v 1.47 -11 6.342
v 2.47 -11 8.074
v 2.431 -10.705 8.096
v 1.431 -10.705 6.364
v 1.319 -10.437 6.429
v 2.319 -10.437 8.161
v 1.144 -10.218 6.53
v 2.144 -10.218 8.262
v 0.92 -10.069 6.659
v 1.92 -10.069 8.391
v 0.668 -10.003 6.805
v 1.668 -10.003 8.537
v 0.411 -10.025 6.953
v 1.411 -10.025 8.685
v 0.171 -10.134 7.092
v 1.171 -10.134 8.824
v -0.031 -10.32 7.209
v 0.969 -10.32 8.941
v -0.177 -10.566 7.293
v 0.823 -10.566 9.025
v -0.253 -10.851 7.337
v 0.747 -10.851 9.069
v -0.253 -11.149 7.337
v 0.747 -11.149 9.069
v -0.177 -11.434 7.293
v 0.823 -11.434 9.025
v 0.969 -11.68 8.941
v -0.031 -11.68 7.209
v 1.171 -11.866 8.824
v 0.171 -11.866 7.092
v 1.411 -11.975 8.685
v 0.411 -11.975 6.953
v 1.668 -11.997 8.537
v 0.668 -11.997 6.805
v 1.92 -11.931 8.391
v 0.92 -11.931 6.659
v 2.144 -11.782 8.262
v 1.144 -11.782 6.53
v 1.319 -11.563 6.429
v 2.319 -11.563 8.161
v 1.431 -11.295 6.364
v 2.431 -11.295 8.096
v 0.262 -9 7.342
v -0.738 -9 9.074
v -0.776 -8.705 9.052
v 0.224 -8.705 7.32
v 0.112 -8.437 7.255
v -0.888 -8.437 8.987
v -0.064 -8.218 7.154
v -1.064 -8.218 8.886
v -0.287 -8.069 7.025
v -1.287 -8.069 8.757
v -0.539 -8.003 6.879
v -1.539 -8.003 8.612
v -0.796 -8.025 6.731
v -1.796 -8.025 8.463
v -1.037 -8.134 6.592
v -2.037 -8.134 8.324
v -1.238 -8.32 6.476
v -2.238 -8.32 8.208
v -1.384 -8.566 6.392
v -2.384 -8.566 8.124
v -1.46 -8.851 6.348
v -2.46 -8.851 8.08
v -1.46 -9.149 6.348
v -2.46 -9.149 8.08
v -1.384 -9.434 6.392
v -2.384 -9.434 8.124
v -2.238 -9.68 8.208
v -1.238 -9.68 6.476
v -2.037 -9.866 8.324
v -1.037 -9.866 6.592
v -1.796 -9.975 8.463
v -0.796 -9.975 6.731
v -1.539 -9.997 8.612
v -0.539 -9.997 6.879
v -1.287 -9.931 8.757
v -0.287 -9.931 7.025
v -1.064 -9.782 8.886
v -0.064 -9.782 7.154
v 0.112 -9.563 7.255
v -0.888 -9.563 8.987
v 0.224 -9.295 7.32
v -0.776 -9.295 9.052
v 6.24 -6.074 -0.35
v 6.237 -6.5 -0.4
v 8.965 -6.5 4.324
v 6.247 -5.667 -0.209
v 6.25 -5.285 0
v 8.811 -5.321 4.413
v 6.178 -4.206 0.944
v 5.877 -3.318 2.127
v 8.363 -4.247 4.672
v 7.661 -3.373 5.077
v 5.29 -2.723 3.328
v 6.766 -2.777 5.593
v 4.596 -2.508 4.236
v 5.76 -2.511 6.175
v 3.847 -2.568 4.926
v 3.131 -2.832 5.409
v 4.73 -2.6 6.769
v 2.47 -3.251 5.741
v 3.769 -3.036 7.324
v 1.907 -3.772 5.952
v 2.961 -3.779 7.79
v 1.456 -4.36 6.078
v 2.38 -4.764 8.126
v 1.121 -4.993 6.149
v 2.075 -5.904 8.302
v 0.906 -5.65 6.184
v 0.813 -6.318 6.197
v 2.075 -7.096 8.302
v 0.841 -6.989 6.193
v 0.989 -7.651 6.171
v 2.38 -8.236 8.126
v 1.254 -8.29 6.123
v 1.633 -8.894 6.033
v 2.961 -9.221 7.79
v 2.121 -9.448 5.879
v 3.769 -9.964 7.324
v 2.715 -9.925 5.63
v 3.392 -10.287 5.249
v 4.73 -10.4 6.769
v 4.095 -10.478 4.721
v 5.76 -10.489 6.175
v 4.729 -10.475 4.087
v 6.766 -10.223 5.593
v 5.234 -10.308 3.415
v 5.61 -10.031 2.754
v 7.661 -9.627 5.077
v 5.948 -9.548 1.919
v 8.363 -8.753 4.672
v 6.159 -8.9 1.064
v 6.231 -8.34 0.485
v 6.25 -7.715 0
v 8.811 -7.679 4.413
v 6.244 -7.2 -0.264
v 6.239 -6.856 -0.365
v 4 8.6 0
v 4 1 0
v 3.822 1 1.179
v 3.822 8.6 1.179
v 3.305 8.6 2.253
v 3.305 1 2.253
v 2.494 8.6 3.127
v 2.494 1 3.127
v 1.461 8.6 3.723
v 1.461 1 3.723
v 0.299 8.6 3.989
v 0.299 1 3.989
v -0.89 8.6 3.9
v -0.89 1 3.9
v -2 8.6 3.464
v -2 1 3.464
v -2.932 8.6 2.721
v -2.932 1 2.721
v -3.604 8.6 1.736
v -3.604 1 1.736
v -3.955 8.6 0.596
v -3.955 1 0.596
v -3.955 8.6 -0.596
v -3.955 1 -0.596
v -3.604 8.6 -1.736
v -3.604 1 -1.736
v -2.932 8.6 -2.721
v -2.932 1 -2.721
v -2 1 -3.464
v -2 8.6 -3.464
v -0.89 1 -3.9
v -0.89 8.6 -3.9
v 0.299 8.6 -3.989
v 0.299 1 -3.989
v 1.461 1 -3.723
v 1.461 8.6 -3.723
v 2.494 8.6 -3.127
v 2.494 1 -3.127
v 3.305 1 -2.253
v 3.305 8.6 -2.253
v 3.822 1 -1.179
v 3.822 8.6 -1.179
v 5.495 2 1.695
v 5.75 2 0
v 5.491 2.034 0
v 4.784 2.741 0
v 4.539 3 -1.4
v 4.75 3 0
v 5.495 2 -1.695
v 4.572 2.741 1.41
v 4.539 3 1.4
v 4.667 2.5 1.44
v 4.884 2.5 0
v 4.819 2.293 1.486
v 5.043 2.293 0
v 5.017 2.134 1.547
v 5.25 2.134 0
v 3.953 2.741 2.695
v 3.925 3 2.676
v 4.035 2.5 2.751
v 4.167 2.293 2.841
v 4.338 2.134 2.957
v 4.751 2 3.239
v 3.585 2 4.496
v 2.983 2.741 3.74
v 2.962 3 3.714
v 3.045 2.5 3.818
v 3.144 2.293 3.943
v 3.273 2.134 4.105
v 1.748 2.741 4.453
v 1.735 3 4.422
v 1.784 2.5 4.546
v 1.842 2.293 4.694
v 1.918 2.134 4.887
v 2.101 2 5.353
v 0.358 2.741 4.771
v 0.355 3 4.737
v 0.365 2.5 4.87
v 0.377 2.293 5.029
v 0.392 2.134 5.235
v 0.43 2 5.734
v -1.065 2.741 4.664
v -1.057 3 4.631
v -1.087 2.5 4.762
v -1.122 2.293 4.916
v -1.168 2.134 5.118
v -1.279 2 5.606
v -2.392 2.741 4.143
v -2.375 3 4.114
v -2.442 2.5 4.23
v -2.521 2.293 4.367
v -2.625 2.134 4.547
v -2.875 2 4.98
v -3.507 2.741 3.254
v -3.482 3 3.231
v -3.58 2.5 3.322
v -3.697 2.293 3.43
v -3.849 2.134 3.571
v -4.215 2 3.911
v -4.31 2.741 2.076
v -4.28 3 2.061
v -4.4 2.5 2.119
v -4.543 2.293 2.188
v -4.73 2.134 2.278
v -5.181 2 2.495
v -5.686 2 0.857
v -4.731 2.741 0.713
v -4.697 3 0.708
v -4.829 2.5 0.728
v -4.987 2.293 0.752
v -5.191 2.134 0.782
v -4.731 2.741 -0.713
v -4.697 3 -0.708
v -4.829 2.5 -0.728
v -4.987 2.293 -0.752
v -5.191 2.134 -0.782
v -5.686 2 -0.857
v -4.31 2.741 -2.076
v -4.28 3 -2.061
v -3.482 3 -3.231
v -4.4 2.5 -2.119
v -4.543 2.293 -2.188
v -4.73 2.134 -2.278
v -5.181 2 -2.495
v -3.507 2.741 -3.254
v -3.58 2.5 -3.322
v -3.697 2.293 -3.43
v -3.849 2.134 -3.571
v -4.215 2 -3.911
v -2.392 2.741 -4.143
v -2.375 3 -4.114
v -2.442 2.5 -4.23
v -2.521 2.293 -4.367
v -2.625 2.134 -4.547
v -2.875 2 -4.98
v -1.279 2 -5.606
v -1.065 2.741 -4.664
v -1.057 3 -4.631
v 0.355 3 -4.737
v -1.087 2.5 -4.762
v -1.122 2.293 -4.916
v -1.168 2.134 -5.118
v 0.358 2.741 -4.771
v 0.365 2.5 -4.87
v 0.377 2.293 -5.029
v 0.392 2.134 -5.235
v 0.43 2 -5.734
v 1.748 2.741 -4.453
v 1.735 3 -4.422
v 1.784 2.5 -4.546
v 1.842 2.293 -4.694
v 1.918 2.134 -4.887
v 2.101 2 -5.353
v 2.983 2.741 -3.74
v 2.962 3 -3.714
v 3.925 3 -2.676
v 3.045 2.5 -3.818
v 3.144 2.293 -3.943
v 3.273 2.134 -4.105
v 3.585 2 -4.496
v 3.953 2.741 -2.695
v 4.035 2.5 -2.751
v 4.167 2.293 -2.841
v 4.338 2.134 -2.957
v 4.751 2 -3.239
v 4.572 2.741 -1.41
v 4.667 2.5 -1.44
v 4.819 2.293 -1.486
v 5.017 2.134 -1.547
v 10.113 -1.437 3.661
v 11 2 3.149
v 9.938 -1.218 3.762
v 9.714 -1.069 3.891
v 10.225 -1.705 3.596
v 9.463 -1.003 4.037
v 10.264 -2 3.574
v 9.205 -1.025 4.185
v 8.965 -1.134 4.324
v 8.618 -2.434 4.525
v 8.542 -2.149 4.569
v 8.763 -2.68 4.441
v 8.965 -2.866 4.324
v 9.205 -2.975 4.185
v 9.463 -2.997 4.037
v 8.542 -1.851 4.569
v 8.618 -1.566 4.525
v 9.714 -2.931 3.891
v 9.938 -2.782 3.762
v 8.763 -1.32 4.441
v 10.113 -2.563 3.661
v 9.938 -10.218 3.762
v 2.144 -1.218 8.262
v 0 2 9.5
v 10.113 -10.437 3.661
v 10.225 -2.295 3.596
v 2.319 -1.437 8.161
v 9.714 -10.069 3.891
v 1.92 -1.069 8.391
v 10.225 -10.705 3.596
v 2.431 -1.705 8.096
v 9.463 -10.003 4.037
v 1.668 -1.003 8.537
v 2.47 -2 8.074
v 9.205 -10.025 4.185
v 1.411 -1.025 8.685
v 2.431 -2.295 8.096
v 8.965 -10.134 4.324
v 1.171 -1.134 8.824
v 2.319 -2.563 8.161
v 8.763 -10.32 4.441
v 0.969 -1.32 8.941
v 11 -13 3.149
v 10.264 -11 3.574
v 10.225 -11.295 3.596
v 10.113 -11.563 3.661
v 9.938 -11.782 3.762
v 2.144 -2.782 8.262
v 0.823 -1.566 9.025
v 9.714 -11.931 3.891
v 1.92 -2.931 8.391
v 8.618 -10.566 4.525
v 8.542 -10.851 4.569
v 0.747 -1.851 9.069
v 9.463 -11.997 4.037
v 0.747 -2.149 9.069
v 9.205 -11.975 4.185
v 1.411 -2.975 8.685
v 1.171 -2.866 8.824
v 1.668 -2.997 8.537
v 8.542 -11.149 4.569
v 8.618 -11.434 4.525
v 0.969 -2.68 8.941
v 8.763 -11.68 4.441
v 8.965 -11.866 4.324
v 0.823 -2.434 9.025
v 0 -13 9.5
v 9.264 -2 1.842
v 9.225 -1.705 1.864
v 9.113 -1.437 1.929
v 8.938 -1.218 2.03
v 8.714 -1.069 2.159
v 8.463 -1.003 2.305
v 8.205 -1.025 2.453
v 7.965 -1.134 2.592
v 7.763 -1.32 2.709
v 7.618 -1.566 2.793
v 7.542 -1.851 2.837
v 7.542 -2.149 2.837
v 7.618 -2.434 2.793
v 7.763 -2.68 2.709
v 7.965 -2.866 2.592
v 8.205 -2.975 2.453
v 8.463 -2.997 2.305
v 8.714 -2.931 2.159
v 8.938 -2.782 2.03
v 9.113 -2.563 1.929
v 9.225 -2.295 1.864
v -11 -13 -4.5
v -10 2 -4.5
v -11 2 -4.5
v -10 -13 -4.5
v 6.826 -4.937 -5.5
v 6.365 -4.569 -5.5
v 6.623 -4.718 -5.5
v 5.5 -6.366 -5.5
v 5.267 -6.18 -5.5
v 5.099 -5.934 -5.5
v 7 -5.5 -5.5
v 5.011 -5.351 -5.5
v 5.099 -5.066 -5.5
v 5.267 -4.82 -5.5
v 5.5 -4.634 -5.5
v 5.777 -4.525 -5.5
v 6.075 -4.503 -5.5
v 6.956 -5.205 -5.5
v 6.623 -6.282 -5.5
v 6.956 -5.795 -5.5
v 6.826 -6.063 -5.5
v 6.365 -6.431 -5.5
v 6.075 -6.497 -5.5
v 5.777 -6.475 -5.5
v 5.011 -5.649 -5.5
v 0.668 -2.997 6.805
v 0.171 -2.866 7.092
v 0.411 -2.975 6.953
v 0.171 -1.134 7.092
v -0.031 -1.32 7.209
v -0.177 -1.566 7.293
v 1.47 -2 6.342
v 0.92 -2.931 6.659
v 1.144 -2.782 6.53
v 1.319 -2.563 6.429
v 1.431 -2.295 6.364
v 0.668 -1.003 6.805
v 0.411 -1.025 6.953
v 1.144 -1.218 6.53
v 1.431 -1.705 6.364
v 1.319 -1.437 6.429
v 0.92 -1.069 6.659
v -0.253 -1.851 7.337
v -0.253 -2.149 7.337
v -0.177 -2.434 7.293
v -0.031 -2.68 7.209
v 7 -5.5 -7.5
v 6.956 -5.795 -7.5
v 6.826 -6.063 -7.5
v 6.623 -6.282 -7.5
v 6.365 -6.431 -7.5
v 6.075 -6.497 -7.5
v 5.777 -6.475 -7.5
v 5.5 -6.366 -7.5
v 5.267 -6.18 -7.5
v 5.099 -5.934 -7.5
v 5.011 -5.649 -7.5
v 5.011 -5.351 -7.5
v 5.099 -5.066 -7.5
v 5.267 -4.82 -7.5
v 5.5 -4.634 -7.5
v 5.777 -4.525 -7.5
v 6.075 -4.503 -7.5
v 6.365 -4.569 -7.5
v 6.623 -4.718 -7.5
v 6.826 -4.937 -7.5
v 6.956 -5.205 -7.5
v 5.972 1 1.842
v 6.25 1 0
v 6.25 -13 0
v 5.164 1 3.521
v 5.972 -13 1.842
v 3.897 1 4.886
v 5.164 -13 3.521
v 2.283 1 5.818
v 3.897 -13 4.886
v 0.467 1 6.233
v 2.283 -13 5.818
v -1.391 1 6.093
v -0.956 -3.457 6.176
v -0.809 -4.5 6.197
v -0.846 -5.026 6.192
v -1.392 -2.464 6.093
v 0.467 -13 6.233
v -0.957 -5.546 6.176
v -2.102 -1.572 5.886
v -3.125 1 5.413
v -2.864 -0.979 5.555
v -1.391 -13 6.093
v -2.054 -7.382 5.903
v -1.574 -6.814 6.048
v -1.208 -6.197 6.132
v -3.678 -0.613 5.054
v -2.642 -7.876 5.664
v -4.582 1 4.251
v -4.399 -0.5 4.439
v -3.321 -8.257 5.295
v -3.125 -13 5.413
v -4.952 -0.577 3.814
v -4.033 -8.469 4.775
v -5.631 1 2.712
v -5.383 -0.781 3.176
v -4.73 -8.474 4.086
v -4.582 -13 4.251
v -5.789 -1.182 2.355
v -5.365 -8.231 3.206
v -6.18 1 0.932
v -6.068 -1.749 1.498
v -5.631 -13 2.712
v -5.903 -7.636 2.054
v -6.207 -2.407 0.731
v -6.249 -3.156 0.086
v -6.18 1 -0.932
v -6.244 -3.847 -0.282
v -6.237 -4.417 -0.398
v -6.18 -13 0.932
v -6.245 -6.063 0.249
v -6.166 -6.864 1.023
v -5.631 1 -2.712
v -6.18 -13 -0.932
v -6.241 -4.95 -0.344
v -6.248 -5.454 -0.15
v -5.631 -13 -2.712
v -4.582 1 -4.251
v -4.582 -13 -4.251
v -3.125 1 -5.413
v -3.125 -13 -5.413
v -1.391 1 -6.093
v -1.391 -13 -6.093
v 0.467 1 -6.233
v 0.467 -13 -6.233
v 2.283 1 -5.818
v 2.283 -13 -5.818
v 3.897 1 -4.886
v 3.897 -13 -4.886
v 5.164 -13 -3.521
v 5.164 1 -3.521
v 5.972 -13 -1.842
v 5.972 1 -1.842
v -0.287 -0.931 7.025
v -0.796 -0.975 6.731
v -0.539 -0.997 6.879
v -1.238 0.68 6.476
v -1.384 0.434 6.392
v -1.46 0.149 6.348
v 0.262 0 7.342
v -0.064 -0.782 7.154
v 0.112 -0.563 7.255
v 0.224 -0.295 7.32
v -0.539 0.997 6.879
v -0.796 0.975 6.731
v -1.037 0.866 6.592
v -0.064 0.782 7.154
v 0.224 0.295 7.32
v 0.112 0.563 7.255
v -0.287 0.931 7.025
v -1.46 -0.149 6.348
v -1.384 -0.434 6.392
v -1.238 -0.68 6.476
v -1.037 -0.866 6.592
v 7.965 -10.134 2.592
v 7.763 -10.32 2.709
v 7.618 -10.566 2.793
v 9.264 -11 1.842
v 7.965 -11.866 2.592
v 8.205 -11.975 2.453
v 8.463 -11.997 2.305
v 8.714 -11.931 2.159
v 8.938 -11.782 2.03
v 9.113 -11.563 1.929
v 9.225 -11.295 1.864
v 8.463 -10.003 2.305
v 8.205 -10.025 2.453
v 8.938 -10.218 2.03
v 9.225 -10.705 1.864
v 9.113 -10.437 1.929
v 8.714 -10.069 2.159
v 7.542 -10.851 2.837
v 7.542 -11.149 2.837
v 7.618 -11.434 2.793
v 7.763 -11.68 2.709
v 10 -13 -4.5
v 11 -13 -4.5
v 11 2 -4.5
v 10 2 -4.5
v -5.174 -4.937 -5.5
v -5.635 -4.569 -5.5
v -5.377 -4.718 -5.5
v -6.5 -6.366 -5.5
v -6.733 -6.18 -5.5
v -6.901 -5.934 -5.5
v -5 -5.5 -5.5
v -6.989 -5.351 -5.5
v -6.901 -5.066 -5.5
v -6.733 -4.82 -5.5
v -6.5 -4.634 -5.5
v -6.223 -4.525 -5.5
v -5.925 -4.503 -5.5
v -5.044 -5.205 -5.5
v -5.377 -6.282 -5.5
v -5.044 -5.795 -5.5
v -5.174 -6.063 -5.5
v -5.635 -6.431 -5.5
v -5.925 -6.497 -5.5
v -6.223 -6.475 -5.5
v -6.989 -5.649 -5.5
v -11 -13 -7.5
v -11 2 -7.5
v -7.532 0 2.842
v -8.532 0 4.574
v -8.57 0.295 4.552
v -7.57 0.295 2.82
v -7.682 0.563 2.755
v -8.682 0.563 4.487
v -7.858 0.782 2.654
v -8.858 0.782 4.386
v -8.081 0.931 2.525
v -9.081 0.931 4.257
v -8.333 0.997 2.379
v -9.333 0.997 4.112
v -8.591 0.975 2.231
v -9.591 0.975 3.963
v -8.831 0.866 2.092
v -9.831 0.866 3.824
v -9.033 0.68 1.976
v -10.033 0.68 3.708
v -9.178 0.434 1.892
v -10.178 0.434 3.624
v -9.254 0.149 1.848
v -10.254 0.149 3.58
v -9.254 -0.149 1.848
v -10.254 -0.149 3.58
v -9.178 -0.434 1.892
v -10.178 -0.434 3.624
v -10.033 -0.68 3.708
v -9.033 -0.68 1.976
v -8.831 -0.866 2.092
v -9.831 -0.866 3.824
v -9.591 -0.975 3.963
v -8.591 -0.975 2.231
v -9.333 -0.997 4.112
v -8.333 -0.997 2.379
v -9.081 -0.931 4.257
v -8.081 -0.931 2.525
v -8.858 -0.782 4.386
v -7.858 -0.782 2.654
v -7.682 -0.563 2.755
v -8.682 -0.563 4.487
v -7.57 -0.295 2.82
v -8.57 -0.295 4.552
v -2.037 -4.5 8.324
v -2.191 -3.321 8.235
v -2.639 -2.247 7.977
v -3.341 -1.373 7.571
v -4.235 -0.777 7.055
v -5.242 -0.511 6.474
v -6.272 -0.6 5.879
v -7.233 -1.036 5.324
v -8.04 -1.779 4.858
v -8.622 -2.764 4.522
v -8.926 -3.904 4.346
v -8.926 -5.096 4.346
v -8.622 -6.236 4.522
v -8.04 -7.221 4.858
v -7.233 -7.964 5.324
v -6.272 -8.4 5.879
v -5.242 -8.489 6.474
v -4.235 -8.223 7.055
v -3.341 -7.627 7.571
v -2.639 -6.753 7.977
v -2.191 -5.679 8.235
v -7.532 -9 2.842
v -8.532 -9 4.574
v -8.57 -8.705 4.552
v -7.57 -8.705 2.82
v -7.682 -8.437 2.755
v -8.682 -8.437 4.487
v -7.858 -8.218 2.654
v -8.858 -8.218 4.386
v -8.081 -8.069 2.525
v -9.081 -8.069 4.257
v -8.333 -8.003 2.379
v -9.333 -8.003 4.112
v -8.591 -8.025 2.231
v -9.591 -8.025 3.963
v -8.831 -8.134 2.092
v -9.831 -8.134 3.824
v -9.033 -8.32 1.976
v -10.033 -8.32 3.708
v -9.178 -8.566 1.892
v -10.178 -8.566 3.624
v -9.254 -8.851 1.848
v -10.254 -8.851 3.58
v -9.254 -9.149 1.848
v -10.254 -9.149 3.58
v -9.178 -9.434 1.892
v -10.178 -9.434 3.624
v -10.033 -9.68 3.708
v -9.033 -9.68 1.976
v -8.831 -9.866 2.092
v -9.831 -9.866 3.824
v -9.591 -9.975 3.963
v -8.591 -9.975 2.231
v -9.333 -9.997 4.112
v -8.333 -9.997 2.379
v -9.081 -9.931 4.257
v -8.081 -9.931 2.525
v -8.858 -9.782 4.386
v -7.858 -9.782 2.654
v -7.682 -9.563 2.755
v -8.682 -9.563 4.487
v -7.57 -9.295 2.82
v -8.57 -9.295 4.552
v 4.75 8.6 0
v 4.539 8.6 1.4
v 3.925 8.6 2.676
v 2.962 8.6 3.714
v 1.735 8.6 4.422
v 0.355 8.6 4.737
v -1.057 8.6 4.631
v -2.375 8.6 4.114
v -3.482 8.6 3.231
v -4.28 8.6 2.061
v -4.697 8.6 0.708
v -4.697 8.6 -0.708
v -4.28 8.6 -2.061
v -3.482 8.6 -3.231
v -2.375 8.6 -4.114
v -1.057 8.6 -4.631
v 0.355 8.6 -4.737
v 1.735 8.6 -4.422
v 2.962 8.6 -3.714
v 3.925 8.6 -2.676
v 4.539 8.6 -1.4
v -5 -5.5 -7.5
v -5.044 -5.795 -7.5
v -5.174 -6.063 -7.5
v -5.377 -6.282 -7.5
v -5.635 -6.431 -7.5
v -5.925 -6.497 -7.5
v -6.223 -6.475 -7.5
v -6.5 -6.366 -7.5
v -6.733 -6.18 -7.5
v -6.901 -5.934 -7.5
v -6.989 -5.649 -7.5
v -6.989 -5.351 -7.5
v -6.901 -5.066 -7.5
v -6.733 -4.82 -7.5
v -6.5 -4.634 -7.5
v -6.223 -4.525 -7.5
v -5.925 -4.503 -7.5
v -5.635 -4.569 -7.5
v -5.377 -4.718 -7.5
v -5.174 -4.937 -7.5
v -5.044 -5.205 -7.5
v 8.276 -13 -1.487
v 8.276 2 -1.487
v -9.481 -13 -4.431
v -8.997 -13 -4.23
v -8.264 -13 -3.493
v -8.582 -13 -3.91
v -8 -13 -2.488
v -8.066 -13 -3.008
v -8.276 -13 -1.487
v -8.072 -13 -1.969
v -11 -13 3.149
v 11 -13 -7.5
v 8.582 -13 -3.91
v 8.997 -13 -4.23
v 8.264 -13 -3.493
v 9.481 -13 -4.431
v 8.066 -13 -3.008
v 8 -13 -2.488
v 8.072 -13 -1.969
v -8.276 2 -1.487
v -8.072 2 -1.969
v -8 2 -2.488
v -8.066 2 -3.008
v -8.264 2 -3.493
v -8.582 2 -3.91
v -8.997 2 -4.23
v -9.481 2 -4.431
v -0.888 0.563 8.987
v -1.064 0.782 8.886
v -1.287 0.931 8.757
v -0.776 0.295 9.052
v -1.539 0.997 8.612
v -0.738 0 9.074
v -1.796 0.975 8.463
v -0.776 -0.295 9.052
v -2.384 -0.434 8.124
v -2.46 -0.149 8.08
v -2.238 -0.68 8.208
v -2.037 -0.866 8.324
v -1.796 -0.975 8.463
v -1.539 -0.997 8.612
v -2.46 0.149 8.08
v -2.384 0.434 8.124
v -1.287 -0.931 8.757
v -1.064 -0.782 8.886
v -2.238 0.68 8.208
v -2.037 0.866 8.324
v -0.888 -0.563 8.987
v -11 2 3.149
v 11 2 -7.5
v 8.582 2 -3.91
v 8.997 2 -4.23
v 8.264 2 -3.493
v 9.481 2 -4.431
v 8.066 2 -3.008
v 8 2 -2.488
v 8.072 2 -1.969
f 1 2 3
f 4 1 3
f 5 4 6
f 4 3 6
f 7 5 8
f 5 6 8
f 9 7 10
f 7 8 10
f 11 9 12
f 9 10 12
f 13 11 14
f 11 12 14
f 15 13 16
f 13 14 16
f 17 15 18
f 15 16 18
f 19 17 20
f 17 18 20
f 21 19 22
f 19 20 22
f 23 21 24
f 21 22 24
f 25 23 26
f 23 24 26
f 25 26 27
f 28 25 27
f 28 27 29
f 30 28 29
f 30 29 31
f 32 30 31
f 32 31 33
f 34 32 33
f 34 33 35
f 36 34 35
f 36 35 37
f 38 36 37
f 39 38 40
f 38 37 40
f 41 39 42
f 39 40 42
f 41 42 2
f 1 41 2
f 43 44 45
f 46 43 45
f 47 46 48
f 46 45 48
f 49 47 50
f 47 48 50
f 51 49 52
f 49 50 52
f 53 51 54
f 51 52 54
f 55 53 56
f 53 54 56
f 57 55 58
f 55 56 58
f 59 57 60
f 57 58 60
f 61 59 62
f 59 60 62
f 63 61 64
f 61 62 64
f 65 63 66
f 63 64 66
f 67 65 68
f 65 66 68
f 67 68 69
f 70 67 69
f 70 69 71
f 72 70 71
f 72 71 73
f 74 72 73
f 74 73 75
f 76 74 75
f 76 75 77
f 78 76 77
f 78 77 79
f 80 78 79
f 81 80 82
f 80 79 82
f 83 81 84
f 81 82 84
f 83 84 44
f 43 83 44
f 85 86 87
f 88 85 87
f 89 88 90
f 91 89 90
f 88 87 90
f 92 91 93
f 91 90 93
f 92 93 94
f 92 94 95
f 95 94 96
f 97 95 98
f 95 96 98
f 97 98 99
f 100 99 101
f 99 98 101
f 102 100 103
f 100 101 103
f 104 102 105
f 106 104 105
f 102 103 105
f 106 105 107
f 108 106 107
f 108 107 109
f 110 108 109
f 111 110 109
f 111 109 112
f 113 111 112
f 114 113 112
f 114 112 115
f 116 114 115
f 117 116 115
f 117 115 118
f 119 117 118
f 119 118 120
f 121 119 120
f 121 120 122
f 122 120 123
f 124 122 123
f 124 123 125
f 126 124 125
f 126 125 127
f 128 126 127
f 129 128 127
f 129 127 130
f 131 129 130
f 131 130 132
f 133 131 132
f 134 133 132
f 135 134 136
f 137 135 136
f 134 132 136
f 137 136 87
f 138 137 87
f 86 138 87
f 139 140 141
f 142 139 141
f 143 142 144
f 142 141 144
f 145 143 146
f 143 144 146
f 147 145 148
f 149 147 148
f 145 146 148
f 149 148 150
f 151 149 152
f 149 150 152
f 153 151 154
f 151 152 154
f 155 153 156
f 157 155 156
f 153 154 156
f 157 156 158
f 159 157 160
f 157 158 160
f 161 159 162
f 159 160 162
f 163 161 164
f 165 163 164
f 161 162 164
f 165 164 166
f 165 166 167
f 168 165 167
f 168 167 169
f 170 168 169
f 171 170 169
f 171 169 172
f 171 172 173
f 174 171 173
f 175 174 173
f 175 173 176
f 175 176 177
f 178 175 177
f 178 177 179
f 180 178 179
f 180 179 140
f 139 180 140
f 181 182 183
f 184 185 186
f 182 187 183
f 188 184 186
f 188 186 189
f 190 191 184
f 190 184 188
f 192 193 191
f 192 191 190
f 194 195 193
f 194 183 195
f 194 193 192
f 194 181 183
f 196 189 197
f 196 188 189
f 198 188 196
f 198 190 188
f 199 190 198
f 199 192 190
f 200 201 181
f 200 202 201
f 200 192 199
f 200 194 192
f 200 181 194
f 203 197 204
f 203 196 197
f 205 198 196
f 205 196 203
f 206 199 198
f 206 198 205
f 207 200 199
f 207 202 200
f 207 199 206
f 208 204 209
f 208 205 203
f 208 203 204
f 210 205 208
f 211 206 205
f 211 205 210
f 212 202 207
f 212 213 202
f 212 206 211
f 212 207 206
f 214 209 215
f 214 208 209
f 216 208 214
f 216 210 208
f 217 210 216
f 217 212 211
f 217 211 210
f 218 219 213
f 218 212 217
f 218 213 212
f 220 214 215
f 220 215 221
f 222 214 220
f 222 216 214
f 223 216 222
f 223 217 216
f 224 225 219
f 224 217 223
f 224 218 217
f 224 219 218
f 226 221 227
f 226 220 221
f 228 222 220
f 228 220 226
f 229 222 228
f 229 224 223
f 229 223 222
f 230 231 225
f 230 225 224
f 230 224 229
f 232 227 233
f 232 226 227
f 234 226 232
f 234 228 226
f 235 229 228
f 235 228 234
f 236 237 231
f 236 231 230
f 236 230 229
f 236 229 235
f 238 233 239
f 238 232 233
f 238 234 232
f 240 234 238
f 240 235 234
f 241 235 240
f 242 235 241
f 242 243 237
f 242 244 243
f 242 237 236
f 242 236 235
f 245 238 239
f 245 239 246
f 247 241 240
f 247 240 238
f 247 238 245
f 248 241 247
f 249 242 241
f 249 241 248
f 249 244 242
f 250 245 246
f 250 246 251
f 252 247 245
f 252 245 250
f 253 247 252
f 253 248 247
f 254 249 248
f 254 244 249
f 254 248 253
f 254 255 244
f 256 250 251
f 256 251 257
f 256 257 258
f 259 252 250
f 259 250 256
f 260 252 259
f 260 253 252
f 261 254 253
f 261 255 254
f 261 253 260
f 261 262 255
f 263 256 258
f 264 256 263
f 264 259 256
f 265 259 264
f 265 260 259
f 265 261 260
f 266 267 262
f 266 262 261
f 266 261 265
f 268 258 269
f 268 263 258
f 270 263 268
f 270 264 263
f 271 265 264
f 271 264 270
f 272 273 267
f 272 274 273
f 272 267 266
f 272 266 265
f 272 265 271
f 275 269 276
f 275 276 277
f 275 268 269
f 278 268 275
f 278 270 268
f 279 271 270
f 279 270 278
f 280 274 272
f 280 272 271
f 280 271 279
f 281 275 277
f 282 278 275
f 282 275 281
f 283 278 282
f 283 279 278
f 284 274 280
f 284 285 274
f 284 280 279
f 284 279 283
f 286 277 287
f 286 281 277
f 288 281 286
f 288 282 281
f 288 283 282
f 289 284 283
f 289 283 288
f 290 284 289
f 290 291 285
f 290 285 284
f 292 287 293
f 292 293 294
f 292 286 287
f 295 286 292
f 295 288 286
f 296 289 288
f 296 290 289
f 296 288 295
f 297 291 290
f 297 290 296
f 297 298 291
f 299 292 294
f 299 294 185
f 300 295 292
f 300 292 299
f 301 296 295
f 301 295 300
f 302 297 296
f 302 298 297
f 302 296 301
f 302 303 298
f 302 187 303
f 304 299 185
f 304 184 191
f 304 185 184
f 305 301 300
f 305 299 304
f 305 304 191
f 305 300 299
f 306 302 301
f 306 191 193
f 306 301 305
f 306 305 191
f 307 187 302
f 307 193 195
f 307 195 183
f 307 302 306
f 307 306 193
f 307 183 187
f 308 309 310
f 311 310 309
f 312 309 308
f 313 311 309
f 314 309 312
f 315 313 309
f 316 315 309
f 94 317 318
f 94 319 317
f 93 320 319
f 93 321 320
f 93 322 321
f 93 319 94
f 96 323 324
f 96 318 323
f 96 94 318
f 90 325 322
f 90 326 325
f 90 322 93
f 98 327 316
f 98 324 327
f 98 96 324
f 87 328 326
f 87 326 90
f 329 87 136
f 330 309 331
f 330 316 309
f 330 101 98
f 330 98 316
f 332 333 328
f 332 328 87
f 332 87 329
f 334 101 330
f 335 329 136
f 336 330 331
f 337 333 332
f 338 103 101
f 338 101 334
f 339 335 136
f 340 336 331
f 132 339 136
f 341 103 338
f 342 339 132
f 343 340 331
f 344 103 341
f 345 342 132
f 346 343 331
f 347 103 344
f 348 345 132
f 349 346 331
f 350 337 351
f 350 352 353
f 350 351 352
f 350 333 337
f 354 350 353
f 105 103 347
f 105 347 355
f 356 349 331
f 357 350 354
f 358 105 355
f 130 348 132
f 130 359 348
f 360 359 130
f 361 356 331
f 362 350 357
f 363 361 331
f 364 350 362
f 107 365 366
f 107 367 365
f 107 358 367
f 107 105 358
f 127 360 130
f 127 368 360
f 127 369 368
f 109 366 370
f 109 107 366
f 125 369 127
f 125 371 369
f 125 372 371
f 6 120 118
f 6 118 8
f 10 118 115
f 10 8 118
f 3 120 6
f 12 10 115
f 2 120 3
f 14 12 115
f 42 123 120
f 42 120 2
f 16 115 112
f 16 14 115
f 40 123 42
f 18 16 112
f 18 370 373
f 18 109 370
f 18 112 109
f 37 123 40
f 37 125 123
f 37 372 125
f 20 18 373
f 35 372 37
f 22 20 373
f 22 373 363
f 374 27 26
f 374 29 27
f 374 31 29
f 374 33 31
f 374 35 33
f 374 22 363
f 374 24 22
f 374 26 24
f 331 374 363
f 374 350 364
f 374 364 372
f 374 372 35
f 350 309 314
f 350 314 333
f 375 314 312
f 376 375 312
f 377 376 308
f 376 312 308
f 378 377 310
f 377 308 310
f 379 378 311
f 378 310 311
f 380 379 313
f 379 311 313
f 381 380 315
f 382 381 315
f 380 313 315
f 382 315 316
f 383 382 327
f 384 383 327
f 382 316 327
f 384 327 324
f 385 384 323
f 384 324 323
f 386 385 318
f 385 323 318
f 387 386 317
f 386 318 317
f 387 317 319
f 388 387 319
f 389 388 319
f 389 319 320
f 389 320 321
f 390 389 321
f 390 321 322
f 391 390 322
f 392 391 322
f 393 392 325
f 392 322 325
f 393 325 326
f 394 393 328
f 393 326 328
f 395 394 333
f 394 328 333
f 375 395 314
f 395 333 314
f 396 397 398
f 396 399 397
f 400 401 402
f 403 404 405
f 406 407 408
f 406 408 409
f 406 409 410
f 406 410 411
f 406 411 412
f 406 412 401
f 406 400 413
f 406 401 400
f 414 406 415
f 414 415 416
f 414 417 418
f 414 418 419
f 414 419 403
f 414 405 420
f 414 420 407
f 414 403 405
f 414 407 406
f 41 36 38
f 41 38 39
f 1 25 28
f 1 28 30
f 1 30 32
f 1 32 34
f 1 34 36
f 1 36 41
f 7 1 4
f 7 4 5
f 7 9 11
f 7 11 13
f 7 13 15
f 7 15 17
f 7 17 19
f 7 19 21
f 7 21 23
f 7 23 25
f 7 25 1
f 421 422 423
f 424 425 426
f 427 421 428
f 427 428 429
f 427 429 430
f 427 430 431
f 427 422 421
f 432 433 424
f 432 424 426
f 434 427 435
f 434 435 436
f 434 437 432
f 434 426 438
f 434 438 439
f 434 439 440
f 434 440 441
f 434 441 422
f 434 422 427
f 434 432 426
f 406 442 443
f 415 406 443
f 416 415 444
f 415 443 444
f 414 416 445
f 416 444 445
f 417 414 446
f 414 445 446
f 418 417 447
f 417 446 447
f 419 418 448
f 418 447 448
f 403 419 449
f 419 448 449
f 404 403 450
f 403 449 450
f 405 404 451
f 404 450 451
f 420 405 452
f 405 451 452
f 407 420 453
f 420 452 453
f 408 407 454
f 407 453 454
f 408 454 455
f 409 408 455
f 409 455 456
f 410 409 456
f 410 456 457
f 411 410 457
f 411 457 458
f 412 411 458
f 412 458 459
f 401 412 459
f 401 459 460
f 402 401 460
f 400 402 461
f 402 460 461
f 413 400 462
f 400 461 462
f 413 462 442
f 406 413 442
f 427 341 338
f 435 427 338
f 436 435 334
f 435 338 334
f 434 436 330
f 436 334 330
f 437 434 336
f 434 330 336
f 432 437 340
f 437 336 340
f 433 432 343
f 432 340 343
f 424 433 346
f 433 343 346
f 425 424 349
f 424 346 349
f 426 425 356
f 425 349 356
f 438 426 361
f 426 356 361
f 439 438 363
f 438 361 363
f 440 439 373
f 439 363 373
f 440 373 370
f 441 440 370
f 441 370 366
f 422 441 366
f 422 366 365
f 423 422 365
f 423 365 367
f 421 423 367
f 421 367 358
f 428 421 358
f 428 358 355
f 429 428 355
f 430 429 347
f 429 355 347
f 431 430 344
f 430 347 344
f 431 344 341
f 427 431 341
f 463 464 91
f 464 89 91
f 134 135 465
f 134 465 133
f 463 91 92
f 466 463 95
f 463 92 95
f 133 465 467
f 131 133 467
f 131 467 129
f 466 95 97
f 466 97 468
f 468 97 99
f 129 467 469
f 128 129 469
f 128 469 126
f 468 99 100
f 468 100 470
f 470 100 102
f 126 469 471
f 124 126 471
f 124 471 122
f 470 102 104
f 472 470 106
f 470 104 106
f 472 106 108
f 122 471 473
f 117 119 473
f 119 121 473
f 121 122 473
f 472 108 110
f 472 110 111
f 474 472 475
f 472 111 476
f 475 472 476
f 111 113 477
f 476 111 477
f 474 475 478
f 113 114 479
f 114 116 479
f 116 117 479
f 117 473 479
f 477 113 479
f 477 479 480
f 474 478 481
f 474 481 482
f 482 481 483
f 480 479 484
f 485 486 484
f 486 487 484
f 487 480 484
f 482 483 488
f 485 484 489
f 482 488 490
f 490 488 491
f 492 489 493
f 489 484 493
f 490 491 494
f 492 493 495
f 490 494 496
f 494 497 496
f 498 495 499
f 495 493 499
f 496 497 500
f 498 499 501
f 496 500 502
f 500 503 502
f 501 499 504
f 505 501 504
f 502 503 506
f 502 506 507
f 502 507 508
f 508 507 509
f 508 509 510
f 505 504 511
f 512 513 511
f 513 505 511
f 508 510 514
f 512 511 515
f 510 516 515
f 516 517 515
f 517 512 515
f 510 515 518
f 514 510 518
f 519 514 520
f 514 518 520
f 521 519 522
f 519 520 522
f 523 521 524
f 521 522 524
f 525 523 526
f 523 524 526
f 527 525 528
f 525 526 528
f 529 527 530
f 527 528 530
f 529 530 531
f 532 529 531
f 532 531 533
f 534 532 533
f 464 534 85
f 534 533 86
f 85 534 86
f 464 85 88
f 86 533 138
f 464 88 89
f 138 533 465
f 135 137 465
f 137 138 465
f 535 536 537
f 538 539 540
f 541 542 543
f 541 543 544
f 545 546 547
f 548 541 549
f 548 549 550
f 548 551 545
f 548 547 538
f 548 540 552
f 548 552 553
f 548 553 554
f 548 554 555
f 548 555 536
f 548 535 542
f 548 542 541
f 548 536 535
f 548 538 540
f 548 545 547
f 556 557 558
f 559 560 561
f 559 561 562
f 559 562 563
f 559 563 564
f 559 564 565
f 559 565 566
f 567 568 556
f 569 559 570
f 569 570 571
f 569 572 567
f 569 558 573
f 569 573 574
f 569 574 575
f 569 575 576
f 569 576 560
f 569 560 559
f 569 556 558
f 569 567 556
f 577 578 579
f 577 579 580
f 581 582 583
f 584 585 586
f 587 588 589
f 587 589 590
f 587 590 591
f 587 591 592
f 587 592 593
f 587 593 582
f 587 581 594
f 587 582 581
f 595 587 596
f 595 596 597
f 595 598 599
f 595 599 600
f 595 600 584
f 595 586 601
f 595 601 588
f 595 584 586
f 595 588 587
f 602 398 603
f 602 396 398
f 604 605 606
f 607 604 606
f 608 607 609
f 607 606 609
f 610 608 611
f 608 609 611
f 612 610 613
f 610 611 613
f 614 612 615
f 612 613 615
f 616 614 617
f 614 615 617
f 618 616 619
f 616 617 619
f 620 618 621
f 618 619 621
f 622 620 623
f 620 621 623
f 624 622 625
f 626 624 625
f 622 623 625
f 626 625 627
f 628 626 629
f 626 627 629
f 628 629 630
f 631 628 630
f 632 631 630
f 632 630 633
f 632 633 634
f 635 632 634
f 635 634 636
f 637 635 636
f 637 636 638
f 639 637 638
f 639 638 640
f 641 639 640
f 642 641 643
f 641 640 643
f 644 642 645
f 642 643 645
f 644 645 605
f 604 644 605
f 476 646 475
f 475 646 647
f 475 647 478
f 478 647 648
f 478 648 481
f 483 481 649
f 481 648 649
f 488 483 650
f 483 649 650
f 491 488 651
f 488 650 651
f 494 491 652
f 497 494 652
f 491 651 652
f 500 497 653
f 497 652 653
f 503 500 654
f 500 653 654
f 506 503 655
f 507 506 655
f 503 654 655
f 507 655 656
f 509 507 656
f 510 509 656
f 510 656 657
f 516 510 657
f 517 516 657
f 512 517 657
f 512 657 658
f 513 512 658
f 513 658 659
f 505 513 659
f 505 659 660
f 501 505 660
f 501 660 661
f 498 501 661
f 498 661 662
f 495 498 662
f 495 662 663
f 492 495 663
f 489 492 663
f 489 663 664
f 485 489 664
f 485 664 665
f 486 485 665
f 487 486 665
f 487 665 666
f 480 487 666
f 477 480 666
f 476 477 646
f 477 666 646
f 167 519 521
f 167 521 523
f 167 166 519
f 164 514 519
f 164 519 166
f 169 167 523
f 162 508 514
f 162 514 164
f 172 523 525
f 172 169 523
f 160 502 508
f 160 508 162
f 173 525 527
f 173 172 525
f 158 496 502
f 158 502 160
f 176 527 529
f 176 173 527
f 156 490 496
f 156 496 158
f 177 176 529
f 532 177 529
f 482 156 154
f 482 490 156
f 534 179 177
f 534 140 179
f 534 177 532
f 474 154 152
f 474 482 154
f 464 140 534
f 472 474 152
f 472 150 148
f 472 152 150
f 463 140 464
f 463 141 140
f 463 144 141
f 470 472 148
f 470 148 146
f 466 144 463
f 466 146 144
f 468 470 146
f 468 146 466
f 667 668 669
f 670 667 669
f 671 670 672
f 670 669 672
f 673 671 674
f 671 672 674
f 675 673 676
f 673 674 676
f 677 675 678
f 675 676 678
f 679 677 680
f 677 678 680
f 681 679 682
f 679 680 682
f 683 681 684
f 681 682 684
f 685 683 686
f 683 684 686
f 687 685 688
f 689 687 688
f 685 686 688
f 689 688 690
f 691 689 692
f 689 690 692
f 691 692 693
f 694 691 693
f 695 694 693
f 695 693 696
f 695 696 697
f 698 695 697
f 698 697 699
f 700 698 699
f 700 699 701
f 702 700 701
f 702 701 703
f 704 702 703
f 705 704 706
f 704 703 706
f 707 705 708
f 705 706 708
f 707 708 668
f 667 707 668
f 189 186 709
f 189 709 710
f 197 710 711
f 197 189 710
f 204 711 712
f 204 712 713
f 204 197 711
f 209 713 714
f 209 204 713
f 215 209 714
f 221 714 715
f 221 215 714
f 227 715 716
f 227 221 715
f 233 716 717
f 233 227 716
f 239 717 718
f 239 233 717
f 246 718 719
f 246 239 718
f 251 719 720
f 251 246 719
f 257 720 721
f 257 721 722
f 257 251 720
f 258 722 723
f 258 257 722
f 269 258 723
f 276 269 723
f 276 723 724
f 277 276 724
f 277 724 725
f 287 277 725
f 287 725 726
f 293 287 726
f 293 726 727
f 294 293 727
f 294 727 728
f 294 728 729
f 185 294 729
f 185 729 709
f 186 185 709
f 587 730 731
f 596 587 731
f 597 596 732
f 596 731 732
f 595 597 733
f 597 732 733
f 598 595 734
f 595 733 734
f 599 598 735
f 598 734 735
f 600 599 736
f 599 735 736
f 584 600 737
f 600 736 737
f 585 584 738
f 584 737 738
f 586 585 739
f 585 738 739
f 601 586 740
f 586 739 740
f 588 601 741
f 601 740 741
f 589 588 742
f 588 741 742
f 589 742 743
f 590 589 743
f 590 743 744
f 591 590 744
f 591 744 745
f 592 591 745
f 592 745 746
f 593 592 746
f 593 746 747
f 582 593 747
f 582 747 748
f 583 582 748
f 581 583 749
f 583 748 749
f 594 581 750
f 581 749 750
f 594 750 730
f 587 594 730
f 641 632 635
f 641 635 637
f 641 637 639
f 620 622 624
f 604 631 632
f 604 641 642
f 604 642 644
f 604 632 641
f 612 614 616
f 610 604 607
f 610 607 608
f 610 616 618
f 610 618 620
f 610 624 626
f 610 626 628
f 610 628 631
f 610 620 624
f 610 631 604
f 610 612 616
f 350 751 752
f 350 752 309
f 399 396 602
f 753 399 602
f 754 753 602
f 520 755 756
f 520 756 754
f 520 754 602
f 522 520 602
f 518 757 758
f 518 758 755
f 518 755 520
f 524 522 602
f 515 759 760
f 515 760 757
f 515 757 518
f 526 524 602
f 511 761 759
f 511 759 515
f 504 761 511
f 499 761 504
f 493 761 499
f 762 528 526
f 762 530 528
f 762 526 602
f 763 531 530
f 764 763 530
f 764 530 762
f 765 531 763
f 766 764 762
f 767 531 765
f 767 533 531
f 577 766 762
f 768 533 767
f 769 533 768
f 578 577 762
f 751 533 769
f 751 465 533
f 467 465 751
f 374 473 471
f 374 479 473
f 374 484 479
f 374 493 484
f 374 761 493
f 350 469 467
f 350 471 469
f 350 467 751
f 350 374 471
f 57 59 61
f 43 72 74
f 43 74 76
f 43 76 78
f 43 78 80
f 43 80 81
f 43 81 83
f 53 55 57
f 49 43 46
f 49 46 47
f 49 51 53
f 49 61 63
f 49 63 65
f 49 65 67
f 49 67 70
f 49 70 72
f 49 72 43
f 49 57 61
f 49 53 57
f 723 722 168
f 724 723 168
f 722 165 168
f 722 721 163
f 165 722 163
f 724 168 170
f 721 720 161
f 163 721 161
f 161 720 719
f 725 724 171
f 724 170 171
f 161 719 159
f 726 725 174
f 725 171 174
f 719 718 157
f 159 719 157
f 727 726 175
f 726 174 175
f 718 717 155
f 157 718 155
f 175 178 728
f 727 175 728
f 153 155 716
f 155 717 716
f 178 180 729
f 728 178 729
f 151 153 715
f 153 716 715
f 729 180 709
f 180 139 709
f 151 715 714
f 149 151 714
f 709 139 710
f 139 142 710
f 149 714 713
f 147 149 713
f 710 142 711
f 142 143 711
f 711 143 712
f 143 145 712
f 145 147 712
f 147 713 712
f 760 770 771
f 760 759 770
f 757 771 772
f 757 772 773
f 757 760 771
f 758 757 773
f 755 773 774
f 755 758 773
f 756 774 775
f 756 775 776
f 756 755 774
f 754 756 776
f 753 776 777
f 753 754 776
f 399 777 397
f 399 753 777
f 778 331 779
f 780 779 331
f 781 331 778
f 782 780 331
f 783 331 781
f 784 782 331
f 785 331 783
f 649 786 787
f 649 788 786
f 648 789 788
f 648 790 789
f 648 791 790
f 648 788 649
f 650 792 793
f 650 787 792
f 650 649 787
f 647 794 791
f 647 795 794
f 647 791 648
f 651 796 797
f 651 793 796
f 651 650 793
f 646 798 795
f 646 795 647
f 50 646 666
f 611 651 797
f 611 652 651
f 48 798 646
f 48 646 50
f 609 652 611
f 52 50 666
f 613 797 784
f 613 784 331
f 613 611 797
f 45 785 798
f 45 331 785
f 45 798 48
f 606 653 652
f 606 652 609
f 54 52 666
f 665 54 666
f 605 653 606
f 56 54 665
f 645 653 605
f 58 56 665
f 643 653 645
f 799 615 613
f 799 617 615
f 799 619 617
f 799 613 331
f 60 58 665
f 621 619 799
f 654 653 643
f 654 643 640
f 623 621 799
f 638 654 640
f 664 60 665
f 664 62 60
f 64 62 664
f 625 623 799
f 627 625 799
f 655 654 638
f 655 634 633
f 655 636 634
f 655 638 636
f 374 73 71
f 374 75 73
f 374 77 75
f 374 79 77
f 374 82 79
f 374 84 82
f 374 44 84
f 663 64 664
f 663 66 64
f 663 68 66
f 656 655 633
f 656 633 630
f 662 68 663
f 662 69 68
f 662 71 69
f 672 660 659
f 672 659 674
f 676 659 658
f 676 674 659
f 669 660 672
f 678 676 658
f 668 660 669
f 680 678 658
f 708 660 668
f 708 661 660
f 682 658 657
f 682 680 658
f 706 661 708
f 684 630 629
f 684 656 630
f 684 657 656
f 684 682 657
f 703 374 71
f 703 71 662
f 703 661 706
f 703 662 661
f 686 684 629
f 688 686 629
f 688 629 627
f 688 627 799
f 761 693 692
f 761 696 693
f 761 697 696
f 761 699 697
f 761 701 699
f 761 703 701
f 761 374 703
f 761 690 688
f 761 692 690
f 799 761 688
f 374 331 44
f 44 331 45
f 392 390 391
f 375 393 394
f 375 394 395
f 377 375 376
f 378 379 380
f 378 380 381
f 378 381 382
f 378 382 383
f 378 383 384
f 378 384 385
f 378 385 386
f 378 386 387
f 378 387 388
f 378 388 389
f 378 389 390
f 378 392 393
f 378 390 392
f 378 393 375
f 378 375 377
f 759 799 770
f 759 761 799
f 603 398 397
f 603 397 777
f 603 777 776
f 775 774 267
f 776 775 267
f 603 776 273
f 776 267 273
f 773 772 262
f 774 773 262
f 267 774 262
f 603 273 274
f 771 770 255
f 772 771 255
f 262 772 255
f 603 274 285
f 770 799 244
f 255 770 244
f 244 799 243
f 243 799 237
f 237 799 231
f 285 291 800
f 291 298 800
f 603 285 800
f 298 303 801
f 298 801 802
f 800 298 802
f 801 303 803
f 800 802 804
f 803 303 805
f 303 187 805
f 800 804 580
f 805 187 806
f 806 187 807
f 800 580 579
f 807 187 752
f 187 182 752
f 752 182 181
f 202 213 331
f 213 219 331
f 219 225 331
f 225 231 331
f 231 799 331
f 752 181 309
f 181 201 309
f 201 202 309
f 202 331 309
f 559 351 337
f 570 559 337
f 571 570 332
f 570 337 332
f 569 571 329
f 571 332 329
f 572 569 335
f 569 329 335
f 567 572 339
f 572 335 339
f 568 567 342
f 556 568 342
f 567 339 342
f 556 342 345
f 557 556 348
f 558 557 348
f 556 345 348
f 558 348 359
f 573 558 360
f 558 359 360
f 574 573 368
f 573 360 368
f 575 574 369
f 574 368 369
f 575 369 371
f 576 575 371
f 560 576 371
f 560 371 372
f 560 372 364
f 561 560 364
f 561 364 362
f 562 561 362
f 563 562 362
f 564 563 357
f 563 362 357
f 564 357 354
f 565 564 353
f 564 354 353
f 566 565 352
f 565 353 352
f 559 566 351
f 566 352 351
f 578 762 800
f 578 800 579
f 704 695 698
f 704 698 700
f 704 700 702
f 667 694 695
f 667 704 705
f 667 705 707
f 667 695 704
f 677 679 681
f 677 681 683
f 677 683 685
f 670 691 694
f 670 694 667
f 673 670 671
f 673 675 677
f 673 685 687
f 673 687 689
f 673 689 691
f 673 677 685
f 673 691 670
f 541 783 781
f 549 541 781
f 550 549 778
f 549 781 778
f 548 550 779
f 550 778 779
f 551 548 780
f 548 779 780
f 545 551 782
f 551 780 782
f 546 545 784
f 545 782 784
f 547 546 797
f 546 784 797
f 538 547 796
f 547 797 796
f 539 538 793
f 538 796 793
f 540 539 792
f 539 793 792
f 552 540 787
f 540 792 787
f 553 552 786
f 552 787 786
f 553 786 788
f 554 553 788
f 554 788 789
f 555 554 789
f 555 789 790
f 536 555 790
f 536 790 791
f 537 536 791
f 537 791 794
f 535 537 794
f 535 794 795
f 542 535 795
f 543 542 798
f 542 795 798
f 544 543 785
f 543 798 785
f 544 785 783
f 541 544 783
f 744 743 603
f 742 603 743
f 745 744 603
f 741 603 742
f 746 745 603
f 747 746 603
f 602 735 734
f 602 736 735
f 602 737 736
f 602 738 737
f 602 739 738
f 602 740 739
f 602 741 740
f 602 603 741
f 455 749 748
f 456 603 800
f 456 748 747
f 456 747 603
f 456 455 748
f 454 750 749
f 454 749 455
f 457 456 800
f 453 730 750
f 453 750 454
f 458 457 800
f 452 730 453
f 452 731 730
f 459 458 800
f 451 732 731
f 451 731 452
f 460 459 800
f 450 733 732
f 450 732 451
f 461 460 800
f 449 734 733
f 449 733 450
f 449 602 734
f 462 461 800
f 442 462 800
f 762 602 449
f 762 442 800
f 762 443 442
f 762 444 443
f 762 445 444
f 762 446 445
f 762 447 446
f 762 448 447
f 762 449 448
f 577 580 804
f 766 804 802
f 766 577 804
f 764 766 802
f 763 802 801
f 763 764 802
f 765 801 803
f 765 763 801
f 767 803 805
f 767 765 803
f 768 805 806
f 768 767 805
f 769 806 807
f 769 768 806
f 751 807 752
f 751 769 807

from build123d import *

# Parameters (mm, degrees)
F0_R      = 6.25
F1_DEPTH  = 13
F0_R_2    = 4.75
F0_R_3    = 4
F2_DEPTH  = 2
F3_DEPTH  = 8.6
F4_R      = 1
F5_R      = 4
F7_DEPTH  = 6.4553484435
F5_R_2    = 1
F8_DEPTH  = 2
F6_R      = 4
F9_DEPTH  = 6.4553484442
F6_R_2    = 1
F10_DEPTH = 2
F11_DEPTH = 1
F12_R     = 1
F13_DEPTH = 2


with BuildPart() as f1:
    # F0 (on Front) → F1 (new body)
    with BuildSketch(Plane.XZ):
        with BuildLine():
            Line((-11, -4.5), (-11, -7.5))
            Line((-11, -7.5), (11, -7.5))
            Line((11, -7.5), (11, -4.5))
            Line((11, -4.5), (10, -4.5))
            ThreePointArc((10, -4.5), (8.2641129984, -3.493325887), (8.2756985044, -1.4866963178))
            Line((8.2756985044, -1.4866963178), (11, 3.1491470389))
            Line((11, 3.1491470389), (0, 9.5))
            Line((0, 9.5), (-11, 3.1491470389))
            Line((-11, 3.1491470389), (-8.2756985044, -1.4866963178))
            ThreePointArc((-8.2756985044, -1.4866963178), (-8.2641129984, -3.493325887), (-10, -4.5))
            Line((-10, -4.5), (-11, -4.5))
        make_face()
        Circle(F0_R, mode=Mode.SUBTRACT)
    extrude(amount=F1_DEPTH)

    # F0 (on Front) → F2 (join)
    with BuildSketch(Plane.XZ):
        with BuildLine():
            Line((-11, -4.5), (-11, -7.5))
            Line((-11, -7.5), (11, -7.5))
            Line((11, -7.5), (11, -4.5))
            Line((11, -4.5), (10, -4.5))
            ThreePointArc((10, -4.5), (8.2641129984, -3.493325887), (8.2756985044, -1.4866963178))
            Line((8.2756985044, -1.4866963178), (11, 3.1491470389))
            Line((11, 3.1491470389), (0, 9.5))
            Line((0, 9.5), (-11, 3.1491470389))
            Line((-11, 3.1491470389), (-8.2756985044, -1.4866963178))
            ThreePointArc((-8.2756985044, -1.4866963178), (-8.2641129984, -3.493325887), (-10, -4.5))
            Line((-10, -4.5), (-11, -4.5))
        make_face()
        Circle(F0_R, mode=Mode.SUBTRACT)
        Circle(F0_R)
        Circle(F0_R_2, mode=Mode.SUBTRACT)
        Circle(F0_R_2)
        Circle(F0_R_3, mode=Mode.SUBTRACT)
    extrude(amount=-F2_DEPTH)

    # F0 (on Front) → F3 (join)
    with BuildSketch(Plane.XZ):
        Circle(F0_R_2)
        Circle(F0_R_3, mode=Mode.SUBTRACT)
    extrude(amount=-F3_DEPTH)

    # F4
    f4_edges = [f1.edges().sort_by_distance(p)[0] for p in [
        (-4.75, 2, 0),
    ]]
    fillet(f4_edges, radius=F4_R)

    # F5 (on face) → F7 (cut, up to face)
    with BuildSketch(Plane(origin=(4.113620668, 0, 7.125), x_dir=(0.8660254038, 0, -0.5), z_dir=(0.5, 0, 0.8660254038))):
        with Locations((1.6017059222, -6.5)):
            Circle(F5_R)
    extrude(amount=-F7_DEPTH, mode=Mode.SUBTRACT)

    # F5 (on face) → F8 (cut)
    with BuildSketch(Plane(origin=(4.113620668, 0, 7.125), x_dir=(0.8660254038, 0, -0.5), z_dir=(0.5, 0, 0.8660254038))):
        with Locations((-2.8982940778, -2)):
            Circle(F5_R_2)
        with Locations((6.1017059222, -2)):
            Circle(F5_R_2)
        with Locations((6.1017059222, -11)):
            Circle(F5_R_2)
        with Locations((-2.8982940778, -11)):
            Circle(F5_R_2)
    extrude(amount=-F8_DEPTH, mode=Mode.SUBTRACT)

    # F6 (on face) → F9 (cut, up to face)
    with BuildSketch(Plane(origin=(-4.113620668, 0, 7.125), x_dir=(0.8660254038, 0, 0.5), z_dir=(-0.5, 0, 0.8660254038))):
        with Locations((-1.6017059222, -4.5)):
            Circle(F6_R)
    extrude(amount=-F9_DEPTH, mode=Mode.SUBTRACT)

    # F6 (on face) → F10 (cut)
    with BuildSketch(Plane(origin=(-4.113620668, 0, 7.125), x_dir=(0.8660254038, 0, 0.5), z_dir=(-0.5, 0, 0.8660254038))):
        with Locations((-6.1017059222, -9)):
            Circle(F6_R_2)
        with Locations((-6.1017059222, 0)):
            Circle(F6_R_2)
        with Locations((2.8982940778, 0)):
            Circle(F6_R_2)
        with Locations((2.8982940778, -9)):
            Circle(F6_R_2)
    extrude(amount=-F10_DEPTH, mode=Mode.SUBTRACT)

    # F0 (on Front) → F11 (cut)
    with BuildSketch(Plane.XZ):
        Circle(F0_R)
        Circle(F0_R_2, mode=Mode.SUBTRACT)
        Circle(F0_R_2)
        Circle(F0_R_3, mode=Mode.SUBTRACT)
    extrude(amount=-F11_DEPTH, mode=Mode.SUBTRACT)

    # F12 (on face) → F13 (cut)
    with BuildSketch(Plane(origin=(0, 0, -7.5), x_dir=(1, 0, 0), z_dir=(0, 0, -1))):
        with Locations((-6, 5.5)):
            Circle(F12_R)
        with Locations((6, 5.5)):
            Circle(F12_R)
    extrude(amount=-F13_DEPTH, mode=Mode.SUBTRACT)


solid = f1.part
